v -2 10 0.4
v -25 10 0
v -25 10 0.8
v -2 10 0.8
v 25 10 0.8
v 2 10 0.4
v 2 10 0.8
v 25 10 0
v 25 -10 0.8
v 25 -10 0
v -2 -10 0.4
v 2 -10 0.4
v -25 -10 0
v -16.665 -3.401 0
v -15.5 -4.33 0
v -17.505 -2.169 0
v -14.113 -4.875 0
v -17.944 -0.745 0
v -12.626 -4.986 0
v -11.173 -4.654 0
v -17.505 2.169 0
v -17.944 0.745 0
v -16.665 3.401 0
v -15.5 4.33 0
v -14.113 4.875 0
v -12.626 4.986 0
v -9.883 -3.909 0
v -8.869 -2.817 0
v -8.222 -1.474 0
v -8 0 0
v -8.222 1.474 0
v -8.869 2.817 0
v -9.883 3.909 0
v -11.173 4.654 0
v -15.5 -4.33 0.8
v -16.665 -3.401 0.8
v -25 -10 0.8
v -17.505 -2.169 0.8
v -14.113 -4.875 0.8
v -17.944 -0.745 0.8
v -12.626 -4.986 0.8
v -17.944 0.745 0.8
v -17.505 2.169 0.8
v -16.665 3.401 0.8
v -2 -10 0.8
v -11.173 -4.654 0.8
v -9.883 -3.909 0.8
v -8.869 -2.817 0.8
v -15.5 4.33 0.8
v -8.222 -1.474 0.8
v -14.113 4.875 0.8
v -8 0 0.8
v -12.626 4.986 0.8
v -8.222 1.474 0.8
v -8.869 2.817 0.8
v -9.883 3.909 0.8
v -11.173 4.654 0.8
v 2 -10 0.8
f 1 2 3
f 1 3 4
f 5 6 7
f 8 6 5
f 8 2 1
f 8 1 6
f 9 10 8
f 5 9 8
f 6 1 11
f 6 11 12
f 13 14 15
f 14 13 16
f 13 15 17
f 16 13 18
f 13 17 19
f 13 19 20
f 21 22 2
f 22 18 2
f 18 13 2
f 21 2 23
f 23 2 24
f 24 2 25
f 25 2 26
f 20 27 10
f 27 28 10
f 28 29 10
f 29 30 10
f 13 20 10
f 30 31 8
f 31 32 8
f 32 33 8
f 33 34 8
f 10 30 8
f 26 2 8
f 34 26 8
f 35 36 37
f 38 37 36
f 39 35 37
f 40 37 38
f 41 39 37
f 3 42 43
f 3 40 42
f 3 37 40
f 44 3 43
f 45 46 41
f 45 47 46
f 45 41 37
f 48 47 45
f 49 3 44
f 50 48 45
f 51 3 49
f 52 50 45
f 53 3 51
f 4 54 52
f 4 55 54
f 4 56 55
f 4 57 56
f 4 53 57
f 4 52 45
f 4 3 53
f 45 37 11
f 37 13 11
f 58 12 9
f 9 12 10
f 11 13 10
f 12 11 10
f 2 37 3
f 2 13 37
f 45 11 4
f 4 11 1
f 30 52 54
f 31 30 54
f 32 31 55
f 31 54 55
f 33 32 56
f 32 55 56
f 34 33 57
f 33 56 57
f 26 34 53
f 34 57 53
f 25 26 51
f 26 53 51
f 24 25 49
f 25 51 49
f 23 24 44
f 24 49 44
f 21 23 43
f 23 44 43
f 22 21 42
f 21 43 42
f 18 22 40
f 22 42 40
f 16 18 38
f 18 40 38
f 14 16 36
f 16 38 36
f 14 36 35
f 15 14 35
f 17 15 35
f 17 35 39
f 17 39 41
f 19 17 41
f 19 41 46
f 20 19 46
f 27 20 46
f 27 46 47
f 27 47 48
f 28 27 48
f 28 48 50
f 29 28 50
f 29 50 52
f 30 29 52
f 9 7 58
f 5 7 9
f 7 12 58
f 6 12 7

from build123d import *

# Parameters (mm, degrees)
F0_W     = 50
F0_H     = 20
F1_DEPTH = 0.4
F2_W     = 23
F2_H     = 20
F3_DEPTH = 0.4
F4_R     = 5
F5_DEPTH = 25


with BuildPart() as f1:
    # F0 (on Top) → F1 (new body)
    with BuildSketch(Plane.XY):
        Rectangle(F0_W, F0_H)
    extrude(amount=F1_DEPTH)

    # F2 (on face) → F3 (join)
    with BuildSketch(Plane.XY.offset(0.4)):
        with Locations((-13.5, 0)):
            Rectangle(F2_W, F2_H)
        with Locations((13.5, 0)):
            Rectangle(F2_W, F2_H)
    extrude(amount=F3_DEPTH)

    # F4 (on face) → F5 (cut)
    with BuildSketch(Plane.XY.offset(0.8)):
        with Locations((-13, 0)):
            Circle(F4_R)
    extrude(amount=-F5_DEPTH, mode=Mode.SUBTRACT)


solid = f1.part
